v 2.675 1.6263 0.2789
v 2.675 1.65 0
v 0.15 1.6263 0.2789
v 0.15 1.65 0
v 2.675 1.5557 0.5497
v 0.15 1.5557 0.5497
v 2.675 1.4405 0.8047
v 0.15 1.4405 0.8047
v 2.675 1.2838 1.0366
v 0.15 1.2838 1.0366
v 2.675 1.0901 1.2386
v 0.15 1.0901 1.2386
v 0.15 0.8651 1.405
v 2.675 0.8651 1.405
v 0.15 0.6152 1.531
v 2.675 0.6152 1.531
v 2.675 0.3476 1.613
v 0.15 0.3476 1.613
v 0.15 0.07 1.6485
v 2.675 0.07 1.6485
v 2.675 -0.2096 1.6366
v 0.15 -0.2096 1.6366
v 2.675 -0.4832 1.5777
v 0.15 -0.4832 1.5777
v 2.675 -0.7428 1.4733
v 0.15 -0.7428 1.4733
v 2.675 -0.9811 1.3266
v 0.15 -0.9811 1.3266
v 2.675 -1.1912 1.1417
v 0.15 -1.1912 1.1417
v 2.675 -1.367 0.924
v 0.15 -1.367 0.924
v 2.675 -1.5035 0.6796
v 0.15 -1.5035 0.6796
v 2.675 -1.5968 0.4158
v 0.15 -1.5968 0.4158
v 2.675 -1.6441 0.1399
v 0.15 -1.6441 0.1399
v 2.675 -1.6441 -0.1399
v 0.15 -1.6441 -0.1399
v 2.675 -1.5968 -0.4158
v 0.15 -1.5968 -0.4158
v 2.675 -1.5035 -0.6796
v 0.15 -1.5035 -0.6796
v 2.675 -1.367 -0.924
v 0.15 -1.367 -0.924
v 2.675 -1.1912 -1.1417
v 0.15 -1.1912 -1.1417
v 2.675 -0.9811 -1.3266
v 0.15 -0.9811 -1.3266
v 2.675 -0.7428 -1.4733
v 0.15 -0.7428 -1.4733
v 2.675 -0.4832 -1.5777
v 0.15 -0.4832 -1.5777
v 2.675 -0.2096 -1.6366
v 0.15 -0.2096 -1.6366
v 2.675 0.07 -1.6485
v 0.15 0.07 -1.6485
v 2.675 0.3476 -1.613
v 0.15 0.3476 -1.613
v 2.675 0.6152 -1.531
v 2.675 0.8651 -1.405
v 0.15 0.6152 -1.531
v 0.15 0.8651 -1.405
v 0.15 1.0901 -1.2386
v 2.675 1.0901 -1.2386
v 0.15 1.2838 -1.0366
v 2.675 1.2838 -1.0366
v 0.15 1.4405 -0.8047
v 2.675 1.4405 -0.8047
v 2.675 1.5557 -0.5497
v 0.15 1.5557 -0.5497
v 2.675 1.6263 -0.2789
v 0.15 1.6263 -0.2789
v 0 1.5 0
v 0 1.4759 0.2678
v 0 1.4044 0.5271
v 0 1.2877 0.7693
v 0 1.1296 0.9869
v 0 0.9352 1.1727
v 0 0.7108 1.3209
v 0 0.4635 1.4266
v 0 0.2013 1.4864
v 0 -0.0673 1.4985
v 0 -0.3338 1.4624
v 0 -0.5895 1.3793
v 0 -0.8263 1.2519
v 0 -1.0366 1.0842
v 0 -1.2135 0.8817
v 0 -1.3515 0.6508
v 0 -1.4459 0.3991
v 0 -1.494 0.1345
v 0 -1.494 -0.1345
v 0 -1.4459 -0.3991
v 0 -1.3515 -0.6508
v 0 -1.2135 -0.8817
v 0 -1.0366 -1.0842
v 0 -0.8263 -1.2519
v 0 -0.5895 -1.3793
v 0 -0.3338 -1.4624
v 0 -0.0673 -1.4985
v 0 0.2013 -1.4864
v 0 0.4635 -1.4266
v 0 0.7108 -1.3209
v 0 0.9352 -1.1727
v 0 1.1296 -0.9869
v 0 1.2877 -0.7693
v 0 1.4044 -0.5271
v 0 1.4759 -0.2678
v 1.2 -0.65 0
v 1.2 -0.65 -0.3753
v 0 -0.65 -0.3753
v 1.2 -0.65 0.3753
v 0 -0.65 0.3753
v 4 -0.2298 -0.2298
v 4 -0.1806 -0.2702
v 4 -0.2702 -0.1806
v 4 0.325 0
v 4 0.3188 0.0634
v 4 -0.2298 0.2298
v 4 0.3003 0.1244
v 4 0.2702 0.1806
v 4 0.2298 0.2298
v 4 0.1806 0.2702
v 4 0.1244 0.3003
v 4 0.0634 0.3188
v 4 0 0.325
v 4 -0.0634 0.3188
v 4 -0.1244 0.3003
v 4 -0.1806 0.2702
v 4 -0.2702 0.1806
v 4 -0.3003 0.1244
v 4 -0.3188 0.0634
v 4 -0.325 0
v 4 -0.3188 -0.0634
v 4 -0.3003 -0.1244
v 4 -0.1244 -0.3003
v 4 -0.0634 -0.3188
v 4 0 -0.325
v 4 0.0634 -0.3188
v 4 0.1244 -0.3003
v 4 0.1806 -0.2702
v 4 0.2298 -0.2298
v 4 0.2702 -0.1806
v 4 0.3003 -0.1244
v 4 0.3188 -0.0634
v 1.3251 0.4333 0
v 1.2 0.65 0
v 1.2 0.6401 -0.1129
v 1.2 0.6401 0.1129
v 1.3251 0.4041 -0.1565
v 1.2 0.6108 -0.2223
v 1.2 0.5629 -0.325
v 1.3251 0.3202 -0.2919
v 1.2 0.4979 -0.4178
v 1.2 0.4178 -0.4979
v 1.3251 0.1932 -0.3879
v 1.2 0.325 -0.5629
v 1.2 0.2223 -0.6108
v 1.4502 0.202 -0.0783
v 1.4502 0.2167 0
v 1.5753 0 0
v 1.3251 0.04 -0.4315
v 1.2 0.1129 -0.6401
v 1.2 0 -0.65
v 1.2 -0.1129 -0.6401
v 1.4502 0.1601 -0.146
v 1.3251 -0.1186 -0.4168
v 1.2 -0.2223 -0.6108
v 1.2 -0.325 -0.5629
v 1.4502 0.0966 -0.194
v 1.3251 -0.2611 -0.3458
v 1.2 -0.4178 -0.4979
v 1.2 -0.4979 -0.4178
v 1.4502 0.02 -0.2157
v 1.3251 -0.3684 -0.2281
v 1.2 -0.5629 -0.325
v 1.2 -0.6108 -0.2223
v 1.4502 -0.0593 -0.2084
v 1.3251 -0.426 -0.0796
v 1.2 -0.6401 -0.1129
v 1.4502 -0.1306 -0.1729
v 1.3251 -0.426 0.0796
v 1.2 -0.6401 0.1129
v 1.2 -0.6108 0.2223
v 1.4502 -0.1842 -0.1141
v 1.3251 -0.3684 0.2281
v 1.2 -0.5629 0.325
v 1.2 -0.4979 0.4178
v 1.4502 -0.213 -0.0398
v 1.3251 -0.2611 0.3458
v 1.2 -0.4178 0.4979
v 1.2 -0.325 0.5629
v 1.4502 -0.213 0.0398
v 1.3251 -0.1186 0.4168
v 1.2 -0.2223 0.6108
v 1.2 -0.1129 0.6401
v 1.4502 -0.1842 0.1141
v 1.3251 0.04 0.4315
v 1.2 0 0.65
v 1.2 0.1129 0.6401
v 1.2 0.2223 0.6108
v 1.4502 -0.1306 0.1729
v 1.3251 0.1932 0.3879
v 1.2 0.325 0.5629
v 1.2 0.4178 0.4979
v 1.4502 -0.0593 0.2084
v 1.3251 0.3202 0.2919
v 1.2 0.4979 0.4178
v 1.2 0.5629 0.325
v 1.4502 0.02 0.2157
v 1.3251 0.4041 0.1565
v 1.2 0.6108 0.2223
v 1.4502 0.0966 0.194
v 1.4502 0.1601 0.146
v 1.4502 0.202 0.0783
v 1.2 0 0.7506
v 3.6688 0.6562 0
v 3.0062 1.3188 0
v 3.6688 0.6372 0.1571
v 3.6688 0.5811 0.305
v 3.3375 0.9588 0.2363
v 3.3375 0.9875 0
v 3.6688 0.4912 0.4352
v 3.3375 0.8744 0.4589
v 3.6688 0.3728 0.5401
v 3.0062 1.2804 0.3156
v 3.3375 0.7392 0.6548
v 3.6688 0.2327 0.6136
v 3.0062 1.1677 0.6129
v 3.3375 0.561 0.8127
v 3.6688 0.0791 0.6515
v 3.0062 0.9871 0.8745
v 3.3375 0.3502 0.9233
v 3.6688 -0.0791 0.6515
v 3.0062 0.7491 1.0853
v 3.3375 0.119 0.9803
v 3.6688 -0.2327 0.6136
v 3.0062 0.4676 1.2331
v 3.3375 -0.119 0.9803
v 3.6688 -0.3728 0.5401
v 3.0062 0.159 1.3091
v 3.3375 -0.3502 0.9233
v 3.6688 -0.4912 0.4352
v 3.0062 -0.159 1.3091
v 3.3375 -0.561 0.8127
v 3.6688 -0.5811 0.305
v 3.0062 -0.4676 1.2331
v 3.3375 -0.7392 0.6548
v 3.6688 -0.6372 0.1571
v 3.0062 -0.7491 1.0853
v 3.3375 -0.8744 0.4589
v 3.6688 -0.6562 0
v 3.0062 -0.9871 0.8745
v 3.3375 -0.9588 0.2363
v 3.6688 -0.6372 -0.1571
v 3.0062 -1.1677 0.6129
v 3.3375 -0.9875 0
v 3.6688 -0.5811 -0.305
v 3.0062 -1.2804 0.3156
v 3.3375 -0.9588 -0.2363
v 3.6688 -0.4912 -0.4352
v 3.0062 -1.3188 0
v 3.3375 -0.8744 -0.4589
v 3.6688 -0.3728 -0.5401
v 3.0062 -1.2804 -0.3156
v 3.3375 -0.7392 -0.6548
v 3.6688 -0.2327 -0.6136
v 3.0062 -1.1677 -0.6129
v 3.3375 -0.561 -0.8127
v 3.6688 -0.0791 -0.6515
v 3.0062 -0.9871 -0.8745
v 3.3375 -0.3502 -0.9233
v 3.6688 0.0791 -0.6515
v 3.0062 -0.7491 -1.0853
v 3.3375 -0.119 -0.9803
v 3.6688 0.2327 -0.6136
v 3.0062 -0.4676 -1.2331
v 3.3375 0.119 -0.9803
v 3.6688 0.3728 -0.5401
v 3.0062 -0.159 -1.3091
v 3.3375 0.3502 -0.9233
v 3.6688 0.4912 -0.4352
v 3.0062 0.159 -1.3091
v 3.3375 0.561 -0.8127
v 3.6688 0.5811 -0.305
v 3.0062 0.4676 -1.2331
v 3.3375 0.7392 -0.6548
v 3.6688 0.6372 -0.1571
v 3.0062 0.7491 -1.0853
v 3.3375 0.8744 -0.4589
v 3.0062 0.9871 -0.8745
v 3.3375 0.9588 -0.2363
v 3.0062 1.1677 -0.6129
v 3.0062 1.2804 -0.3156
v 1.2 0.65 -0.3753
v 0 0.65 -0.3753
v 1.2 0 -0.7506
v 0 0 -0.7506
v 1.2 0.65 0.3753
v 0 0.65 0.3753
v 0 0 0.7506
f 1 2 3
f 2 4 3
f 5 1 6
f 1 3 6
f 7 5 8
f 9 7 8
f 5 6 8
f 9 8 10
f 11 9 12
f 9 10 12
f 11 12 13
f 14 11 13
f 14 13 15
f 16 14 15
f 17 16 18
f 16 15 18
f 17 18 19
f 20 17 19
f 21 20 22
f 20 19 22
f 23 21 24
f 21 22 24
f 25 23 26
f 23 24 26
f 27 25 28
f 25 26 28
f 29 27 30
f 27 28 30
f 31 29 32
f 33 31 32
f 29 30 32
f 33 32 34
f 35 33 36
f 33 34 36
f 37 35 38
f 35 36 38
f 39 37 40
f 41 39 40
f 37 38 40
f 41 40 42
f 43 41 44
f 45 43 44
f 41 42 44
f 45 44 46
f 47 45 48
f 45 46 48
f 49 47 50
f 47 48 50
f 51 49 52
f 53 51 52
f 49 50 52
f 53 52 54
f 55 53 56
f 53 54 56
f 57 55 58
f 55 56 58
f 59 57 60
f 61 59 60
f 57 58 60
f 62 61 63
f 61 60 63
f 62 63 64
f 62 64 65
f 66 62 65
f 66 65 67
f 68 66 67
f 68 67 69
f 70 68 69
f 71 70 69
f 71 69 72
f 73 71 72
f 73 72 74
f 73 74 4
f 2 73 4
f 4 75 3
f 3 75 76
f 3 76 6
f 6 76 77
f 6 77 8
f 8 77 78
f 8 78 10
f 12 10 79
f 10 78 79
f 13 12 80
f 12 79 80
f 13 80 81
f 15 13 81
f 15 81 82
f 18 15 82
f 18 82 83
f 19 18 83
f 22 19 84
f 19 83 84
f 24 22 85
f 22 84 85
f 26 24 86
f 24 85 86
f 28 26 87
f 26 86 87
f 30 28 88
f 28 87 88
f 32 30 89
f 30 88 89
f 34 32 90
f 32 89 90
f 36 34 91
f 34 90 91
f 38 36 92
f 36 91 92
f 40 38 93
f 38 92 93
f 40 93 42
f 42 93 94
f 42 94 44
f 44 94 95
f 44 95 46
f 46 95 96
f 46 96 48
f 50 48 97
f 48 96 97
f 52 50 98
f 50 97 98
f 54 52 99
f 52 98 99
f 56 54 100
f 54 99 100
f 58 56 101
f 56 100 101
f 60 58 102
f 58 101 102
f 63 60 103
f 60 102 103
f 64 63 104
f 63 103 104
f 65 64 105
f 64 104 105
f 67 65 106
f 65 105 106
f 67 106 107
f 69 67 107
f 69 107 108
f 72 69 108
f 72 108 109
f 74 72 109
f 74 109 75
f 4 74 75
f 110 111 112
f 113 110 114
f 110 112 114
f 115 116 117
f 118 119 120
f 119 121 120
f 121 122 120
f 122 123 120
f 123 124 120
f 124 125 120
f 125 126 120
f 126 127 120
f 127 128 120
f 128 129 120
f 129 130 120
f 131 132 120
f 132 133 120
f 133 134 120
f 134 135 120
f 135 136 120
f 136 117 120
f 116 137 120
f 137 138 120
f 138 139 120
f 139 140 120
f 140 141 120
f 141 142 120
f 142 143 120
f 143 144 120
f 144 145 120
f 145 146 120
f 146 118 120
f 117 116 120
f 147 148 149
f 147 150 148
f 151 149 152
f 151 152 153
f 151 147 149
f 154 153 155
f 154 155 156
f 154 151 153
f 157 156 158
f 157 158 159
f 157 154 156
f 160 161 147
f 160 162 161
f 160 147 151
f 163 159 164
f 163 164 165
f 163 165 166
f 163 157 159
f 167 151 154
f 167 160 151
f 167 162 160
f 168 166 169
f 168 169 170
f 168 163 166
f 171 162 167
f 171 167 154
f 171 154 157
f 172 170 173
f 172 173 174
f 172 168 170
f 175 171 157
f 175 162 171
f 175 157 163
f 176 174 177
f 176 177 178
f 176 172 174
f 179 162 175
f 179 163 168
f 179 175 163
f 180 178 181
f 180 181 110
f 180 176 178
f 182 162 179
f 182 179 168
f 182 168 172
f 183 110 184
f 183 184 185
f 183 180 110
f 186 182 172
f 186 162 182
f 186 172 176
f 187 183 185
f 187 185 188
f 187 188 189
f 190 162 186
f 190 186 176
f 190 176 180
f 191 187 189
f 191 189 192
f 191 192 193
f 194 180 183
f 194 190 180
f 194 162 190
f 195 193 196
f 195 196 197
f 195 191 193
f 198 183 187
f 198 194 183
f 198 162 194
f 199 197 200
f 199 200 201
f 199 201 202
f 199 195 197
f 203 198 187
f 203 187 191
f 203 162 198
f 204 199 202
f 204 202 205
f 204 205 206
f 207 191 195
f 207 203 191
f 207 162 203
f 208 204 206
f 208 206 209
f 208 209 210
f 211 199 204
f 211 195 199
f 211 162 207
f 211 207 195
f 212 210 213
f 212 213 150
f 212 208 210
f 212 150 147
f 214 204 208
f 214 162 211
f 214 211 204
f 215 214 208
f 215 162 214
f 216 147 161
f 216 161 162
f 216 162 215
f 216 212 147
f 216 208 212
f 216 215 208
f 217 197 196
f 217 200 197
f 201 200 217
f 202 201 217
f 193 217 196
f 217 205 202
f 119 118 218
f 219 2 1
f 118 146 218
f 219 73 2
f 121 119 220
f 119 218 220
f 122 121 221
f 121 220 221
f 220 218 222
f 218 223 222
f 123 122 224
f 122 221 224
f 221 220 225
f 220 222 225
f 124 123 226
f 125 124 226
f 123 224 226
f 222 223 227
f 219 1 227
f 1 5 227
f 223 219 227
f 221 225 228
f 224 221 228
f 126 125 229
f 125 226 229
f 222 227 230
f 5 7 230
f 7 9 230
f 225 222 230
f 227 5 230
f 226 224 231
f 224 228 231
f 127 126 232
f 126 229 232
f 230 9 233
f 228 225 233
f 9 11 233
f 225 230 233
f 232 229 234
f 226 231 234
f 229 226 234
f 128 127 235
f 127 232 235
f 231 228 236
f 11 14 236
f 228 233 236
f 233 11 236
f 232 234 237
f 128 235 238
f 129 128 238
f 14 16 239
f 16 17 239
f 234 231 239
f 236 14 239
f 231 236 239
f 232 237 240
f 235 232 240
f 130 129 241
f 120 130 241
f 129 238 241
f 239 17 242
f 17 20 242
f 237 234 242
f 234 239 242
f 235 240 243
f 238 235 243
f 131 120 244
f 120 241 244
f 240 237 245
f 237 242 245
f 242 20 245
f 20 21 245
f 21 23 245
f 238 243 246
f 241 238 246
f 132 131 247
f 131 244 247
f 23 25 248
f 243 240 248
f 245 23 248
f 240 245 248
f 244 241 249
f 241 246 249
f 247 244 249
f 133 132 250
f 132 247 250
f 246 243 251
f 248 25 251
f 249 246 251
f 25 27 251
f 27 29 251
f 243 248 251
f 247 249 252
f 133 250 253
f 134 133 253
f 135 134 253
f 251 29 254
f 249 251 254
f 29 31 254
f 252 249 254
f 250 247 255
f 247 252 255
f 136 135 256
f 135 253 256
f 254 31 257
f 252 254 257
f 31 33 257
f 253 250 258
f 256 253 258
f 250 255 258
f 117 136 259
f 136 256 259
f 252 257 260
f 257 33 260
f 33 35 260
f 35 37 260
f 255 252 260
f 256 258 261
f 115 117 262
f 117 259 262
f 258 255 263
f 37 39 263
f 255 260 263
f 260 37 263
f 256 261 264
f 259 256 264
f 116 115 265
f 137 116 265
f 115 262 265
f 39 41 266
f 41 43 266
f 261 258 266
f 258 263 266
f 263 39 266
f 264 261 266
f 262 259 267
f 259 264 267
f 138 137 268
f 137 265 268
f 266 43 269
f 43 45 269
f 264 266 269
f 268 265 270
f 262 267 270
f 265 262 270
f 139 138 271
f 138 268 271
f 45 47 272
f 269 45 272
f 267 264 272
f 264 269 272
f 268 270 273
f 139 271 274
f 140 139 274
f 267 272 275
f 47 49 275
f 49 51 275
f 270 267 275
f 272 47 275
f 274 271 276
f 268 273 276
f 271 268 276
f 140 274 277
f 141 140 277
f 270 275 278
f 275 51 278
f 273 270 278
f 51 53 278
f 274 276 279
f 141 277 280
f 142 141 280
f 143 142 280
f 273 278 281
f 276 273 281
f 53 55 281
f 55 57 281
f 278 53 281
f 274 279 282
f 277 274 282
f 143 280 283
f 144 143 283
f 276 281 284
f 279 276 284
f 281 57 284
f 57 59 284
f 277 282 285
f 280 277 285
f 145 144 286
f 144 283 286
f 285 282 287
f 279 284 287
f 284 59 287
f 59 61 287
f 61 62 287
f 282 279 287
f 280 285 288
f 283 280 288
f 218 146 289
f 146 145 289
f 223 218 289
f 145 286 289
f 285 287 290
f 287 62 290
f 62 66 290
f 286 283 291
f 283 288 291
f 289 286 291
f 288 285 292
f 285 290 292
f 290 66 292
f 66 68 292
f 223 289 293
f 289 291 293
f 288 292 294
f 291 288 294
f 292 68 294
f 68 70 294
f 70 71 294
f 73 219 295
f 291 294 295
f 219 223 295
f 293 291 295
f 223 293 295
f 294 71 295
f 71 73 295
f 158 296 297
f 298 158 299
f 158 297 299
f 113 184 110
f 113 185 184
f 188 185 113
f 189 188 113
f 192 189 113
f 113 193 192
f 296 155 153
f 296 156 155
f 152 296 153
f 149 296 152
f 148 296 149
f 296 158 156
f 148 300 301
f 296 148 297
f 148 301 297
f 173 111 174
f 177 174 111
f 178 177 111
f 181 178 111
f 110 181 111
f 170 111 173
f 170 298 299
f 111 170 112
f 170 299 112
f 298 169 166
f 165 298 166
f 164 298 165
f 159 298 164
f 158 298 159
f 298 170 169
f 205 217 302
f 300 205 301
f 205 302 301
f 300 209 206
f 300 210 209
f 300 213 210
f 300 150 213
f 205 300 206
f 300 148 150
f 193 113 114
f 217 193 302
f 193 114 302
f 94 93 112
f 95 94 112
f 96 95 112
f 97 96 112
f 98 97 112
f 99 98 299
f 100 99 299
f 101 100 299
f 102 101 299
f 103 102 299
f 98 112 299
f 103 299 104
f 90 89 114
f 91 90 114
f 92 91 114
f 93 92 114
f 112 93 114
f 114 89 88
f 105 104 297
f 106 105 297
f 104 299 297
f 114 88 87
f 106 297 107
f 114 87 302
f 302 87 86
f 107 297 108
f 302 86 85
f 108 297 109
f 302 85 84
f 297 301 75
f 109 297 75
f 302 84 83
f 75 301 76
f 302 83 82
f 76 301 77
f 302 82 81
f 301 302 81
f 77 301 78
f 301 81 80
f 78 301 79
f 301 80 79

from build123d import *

# Parameters (mm, degrees)
HEXAGONSOCKET_DEPTH = 1.2


with BuildPart() as part:
    # Sketch1 → Base (revolve)
    with BuildSketch(Plane.XY):
        Polygon((0, 0), (4, 0), (4, 0.325), (2.675, 1.65), (0.15, 1.65), (0, 1.5), align=None)
    revolve(axis=Axis((-14.774129749, 0, 0), (1, 0, 0)))

    # Sketch2 → HexagonSocket (cut)
    with BuildSketch(Plane(origin=(0, 0.220293087, -0.139195271), x_dir=(0, 0, 1), z_dir=(-1, 0, 0))):
        Polygon((0.889750621, -0.220293087), (0.514472946, 0.429706913), (-0.236082404, 0.429706913), (-0.611360079, -0.220293087), (-0.236082404, -0.870293087), (0.514472946, -0.870293087), align=None)
    extrude(amount=-HEXAGONSOCKET_DEPTH, mode=Mode.SUBTRACT)

    # Sketch3 → Cut-Revolve (revolve, cut)
    with BuildSketch(Plane.XY):
        Polygon((1.2, 0.65), (1.575277675, 0), (1.2, 0), align=None)
    revolve(axis=Axis((1.2, 0, 0), (-1, 0, 0)), mode=Mode.SUBTRACT)


solid = part.part
